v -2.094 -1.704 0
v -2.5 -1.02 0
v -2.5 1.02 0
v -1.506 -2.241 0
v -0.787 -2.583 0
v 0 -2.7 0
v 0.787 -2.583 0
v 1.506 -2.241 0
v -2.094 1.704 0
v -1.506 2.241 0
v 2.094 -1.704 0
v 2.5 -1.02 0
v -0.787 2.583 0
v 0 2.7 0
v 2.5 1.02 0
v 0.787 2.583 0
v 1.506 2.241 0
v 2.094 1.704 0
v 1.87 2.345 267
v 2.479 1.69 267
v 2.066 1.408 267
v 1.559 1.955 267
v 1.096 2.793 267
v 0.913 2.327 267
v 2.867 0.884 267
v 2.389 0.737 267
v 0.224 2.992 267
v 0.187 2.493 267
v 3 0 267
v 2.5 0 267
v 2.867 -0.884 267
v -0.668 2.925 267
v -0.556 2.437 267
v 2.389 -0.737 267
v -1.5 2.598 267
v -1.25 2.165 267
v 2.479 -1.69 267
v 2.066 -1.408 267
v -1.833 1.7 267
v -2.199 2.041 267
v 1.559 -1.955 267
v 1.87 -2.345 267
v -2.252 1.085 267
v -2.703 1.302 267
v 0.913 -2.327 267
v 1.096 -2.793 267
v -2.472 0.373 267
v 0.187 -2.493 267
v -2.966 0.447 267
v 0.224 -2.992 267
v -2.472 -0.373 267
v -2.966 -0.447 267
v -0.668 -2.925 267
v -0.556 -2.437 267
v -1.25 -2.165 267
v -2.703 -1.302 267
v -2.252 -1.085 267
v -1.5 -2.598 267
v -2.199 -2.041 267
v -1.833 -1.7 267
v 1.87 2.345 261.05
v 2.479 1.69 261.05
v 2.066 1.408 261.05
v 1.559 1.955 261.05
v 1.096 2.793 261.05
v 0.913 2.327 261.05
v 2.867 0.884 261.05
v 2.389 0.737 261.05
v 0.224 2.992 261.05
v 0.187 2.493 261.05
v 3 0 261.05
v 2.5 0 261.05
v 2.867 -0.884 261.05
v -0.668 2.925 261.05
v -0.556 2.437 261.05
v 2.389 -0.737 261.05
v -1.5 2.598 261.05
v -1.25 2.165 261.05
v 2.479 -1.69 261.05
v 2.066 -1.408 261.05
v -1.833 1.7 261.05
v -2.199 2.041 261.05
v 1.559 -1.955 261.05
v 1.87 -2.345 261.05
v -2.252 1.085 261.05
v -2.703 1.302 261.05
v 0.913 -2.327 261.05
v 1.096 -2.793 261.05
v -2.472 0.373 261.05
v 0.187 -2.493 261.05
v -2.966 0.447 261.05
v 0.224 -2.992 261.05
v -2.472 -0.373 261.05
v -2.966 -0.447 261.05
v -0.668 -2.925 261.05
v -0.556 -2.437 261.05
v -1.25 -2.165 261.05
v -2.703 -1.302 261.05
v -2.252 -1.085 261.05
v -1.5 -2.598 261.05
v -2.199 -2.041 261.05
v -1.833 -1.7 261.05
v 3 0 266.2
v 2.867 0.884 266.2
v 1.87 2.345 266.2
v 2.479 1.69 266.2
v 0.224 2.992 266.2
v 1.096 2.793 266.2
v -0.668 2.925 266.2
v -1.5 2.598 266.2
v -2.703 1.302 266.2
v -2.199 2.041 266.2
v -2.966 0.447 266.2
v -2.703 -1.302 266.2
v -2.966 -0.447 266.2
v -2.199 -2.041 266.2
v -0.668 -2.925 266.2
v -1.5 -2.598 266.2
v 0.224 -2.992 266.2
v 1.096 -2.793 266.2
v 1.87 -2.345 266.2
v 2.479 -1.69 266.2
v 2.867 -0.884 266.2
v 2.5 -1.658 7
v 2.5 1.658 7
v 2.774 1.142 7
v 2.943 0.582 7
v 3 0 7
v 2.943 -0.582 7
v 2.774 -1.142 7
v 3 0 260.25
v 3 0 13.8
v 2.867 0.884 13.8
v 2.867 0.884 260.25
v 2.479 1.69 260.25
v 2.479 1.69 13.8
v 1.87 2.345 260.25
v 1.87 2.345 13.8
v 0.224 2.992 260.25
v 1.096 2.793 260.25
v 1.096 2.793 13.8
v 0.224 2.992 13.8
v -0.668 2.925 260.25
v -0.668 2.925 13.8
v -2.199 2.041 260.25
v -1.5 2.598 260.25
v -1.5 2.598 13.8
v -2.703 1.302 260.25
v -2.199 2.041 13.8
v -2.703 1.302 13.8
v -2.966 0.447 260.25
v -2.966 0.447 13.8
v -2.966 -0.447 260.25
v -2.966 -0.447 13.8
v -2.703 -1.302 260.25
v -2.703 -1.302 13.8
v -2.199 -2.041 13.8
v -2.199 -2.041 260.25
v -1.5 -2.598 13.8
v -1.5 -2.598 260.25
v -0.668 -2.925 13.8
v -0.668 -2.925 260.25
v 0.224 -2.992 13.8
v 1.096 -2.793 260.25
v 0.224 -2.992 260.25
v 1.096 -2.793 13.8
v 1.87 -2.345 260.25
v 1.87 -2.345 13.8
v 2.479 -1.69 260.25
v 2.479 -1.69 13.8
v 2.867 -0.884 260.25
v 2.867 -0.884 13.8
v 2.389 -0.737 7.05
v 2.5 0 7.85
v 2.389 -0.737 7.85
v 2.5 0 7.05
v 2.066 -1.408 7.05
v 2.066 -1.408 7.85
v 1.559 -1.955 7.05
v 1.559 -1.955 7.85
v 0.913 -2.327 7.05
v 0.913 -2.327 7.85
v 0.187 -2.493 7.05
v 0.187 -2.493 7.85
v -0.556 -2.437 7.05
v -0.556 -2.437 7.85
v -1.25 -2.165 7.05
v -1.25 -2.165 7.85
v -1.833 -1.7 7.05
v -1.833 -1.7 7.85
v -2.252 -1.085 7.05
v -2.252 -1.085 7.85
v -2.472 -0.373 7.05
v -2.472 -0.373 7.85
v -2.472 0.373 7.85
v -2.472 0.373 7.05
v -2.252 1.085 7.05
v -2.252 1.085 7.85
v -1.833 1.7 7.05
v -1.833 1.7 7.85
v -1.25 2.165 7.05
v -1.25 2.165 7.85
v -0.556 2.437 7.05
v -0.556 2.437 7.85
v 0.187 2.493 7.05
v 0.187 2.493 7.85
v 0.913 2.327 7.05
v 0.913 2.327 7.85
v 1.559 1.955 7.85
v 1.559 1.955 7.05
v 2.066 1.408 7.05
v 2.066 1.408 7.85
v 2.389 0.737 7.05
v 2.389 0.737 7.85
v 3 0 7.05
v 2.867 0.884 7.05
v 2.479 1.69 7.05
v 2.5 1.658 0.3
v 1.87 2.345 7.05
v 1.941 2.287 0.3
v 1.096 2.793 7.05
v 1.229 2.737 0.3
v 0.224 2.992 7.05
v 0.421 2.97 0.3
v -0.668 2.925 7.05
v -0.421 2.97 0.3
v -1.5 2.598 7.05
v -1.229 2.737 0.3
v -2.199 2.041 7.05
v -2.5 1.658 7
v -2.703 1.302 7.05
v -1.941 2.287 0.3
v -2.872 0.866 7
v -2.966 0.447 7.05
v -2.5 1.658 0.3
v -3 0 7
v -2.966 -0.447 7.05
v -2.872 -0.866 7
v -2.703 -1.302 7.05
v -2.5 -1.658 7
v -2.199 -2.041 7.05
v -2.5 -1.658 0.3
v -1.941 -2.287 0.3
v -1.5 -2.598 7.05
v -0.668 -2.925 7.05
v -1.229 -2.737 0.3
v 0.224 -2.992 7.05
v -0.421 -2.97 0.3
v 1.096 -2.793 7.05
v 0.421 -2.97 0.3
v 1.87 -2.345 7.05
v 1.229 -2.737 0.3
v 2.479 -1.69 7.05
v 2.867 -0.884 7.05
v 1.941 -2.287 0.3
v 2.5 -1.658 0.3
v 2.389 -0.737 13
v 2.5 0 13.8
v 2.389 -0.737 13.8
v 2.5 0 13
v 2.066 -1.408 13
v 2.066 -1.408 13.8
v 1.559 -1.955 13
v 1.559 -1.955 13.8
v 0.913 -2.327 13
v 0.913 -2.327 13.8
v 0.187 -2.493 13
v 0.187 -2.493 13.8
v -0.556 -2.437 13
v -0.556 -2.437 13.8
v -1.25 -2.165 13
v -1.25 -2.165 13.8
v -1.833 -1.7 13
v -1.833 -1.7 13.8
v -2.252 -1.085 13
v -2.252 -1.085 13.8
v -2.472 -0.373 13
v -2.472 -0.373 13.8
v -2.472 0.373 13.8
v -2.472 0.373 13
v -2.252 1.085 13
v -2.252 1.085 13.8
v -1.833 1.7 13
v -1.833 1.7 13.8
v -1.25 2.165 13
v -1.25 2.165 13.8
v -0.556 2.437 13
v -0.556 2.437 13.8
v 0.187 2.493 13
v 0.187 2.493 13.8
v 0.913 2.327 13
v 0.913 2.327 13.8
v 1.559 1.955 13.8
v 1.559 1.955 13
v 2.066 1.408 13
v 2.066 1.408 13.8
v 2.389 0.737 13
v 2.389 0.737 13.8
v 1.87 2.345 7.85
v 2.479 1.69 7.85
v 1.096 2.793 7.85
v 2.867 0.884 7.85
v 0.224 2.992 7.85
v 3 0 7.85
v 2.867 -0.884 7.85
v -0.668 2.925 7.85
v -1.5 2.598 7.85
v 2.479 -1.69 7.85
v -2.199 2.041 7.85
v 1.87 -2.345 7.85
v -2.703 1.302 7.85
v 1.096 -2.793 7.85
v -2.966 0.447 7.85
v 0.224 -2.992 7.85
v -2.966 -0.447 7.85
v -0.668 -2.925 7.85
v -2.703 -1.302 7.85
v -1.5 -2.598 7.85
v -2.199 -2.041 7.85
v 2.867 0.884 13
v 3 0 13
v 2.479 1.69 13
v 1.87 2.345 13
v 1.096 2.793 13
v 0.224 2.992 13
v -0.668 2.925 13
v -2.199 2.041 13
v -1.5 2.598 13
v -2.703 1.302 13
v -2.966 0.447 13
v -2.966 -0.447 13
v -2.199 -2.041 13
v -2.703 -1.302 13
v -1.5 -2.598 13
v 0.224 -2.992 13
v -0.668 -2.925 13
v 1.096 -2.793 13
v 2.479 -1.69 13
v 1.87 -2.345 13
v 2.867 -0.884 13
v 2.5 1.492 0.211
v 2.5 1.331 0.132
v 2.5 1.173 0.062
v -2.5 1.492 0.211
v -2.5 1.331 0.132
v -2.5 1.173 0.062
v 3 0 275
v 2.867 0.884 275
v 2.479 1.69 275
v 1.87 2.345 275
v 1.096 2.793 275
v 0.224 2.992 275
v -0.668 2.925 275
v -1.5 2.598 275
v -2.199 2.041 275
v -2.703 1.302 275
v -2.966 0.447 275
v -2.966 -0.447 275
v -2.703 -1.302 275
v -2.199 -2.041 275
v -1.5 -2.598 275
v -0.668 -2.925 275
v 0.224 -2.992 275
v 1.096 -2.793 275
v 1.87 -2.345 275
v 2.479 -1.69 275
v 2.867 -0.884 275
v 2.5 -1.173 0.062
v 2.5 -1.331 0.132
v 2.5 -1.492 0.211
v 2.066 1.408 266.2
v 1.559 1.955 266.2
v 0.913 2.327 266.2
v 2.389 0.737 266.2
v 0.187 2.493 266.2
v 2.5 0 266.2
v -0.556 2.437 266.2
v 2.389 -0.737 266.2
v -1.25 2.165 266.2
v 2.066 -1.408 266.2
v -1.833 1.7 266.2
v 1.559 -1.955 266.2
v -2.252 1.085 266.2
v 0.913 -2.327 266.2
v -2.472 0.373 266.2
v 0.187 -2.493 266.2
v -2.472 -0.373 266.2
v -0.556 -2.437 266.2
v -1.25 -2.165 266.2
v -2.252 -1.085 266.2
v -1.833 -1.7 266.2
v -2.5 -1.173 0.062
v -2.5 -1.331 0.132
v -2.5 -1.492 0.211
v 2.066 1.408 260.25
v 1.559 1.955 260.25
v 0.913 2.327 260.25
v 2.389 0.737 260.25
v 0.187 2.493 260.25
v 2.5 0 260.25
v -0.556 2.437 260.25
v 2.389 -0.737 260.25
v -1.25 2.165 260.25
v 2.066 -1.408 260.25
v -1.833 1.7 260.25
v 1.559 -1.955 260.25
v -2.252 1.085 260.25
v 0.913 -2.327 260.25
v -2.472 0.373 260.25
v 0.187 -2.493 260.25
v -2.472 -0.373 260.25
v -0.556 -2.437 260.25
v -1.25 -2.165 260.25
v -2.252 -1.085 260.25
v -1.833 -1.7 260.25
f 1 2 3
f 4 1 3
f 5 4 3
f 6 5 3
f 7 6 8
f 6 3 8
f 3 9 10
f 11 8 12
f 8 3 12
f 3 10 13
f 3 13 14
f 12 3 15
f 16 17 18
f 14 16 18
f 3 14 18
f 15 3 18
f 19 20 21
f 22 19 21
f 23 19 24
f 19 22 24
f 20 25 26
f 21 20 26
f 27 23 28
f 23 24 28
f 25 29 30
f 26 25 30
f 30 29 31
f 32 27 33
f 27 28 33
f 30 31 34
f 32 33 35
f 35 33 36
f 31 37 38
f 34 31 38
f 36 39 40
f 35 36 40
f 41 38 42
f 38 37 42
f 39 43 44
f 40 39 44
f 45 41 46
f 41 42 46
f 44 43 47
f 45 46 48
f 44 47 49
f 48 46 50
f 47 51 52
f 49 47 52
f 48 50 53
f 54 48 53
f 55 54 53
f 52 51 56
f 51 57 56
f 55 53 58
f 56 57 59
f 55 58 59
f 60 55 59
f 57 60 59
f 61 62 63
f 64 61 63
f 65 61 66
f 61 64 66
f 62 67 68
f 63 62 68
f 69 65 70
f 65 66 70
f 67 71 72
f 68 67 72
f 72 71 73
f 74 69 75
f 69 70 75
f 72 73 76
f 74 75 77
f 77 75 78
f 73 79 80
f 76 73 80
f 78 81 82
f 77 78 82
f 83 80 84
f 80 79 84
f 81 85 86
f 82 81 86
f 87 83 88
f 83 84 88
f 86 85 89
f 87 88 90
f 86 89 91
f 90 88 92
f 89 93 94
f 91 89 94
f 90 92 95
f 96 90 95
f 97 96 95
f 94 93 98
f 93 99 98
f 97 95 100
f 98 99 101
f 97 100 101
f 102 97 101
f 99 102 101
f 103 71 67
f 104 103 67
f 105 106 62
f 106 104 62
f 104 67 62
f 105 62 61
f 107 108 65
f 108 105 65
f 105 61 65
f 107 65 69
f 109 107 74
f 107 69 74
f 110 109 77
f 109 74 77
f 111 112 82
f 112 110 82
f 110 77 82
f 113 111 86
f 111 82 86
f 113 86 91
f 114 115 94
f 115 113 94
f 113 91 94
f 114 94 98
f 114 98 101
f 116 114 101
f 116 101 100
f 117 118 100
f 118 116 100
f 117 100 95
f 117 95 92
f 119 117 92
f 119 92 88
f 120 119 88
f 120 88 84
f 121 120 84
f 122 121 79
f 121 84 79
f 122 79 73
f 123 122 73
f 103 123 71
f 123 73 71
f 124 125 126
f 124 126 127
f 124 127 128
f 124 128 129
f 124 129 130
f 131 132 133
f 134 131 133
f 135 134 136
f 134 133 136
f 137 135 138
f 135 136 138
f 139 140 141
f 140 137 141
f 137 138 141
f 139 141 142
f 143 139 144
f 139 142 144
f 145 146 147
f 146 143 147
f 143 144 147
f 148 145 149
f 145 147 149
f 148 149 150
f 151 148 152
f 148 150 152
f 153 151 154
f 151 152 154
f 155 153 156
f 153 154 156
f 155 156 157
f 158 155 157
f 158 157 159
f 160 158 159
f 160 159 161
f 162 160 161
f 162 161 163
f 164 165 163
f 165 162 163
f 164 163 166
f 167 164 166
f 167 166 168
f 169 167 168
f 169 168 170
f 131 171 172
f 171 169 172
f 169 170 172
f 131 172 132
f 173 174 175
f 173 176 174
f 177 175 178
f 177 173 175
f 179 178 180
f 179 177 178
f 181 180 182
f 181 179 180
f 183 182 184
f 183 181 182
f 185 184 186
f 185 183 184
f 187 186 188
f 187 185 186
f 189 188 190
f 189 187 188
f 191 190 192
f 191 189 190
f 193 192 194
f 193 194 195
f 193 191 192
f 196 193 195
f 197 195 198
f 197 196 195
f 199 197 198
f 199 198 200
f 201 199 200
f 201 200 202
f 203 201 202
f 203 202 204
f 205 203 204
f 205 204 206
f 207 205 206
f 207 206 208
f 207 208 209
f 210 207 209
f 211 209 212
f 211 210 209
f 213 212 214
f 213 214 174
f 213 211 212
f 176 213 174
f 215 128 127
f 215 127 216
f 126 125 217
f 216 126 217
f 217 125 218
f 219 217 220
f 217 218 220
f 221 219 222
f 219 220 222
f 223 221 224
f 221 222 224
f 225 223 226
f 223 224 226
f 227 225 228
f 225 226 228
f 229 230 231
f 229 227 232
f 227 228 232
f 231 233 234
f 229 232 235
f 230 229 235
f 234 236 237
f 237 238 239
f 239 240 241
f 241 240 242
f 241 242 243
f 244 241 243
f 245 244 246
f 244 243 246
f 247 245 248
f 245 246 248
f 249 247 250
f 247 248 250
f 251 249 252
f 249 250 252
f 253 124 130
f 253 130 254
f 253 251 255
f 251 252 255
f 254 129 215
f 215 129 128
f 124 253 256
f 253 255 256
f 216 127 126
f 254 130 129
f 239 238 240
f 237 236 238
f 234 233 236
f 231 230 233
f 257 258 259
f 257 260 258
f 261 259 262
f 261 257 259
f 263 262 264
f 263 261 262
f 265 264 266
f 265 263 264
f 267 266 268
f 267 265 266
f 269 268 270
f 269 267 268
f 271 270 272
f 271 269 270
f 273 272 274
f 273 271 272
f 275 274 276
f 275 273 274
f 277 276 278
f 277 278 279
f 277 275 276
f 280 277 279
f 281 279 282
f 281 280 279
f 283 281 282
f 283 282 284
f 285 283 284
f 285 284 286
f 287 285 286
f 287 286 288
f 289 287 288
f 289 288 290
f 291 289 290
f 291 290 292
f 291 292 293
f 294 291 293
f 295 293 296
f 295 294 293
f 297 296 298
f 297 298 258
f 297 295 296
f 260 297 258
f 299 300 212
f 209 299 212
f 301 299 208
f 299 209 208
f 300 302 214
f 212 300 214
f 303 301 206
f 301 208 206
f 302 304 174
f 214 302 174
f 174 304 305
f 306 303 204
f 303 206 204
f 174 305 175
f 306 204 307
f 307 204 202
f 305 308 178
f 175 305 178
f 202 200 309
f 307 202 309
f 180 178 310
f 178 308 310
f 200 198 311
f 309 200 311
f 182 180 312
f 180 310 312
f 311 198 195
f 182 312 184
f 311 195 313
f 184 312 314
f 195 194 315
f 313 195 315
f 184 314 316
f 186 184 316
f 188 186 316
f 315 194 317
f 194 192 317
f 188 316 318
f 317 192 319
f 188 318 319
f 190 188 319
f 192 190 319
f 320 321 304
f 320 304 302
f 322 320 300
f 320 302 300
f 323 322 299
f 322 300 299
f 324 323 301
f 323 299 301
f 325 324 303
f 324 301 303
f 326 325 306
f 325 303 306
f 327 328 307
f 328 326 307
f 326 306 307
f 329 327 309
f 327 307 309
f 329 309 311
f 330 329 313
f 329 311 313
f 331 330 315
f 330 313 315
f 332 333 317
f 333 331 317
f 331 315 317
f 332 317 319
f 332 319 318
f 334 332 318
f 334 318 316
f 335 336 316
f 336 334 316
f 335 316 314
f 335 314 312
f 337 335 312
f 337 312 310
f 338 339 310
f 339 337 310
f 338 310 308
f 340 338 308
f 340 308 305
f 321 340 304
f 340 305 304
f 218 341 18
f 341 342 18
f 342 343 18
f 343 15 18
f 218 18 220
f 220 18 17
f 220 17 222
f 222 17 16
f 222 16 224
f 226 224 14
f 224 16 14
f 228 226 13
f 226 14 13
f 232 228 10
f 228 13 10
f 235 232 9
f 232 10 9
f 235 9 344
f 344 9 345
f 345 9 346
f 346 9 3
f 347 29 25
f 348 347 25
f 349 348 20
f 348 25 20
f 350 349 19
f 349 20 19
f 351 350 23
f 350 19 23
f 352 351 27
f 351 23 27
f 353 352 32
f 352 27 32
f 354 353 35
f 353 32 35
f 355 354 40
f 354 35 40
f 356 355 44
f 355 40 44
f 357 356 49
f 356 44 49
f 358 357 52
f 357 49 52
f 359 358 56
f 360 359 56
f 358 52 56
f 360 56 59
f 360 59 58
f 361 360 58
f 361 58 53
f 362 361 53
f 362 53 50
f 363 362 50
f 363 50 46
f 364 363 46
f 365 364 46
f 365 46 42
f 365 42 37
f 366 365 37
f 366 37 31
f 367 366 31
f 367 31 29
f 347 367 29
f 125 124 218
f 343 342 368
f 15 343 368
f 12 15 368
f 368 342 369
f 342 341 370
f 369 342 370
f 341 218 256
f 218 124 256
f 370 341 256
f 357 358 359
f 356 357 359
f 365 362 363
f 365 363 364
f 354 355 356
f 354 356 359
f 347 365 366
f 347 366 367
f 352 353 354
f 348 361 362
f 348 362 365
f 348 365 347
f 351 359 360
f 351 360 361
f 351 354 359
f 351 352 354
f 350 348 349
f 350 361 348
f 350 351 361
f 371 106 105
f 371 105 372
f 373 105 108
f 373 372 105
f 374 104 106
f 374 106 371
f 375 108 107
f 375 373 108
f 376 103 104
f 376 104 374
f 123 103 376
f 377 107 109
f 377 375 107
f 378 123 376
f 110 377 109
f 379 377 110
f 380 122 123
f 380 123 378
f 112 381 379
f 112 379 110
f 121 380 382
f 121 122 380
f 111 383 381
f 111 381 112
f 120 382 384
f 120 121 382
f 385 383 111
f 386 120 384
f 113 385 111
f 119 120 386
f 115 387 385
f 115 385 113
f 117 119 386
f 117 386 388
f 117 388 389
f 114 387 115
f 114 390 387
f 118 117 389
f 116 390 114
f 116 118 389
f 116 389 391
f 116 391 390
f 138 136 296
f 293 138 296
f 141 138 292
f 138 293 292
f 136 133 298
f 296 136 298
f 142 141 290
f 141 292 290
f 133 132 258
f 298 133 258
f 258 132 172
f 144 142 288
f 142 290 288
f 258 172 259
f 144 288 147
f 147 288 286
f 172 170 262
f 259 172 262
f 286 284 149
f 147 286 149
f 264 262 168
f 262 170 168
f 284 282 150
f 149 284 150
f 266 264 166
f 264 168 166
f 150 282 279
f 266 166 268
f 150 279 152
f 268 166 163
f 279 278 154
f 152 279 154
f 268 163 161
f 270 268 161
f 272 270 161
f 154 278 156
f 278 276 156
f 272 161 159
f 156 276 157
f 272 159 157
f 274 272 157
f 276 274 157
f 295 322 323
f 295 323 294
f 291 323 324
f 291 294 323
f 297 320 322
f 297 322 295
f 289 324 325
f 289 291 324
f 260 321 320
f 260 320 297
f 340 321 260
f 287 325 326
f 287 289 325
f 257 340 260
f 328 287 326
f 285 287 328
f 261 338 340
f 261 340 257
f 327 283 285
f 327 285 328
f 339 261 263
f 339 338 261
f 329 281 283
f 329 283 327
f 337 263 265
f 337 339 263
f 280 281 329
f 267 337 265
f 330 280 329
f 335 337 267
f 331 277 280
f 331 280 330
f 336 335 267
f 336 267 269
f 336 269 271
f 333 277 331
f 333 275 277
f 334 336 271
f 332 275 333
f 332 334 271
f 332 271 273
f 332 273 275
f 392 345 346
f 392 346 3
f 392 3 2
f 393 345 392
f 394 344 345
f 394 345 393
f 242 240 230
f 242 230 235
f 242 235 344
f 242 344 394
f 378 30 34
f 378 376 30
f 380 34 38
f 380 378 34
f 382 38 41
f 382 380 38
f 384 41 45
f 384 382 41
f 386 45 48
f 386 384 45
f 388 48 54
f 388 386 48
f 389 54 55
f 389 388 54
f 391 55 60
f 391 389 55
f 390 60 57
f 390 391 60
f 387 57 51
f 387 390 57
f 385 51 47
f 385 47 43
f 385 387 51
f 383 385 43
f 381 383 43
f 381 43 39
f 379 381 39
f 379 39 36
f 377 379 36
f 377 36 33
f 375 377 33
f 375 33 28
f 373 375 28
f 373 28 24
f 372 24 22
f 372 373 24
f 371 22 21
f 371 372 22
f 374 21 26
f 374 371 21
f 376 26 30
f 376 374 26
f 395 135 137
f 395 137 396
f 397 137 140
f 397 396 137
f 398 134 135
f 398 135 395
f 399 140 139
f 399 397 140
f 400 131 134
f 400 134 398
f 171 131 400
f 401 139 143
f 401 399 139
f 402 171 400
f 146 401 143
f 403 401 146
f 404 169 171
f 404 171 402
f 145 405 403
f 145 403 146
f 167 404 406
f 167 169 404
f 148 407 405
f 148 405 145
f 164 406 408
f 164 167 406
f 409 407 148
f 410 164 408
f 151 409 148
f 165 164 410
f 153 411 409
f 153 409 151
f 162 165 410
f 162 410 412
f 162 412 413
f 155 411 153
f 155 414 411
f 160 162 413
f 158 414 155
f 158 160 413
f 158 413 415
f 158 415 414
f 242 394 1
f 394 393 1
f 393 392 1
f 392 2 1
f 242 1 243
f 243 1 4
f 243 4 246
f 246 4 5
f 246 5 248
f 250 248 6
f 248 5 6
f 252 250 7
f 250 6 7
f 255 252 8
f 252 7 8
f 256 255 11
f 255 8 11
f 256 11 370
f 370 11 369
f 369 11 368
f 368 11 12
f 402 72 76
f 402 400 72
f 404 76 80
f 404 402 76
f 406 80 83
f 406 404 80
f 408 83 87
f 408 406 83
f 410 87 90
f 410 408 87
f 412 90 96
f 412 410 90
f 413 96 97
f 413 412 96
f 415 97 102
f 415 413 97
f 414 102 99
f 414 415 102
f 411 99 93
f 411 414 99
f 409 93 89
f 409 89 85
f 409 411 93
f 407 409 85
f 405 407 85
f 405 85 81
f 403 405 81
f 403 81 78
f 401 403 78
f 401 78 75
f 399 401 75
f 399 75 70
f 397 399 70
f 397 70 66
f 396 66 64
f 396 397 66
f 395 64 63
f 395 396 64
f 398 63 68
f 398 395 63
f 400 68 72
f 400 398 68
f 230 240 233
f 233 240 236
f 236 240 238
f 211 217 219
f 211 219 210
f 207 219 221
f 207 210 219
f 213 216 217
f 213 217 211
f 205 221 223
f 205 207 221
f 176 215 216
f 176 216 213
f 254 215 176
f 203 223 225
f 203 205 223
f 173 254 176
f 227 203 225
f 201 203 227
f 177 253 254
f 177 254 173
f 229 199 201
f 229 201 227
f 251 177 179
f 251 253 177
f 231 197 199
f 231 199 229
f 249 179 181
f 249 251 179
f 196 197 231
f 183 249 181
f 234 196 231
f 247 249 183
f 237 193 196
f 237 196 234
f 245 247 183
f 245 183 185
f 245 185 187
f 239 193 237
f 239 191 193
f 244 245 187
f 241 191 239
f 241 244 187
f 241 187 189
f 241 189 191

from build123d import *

# Parameters (mm, degrees)
SKETCH1_R               = 3
BOSS_EXTRUDE1_DEPTH     = 275
SKETCH3_W               = 0.8
SKETCH3_H               = 0.5
CUT_EXTRUDE2_DEPTH      = 276.032725326
CUT_EXTRUDE2_DEPTH_BACK = 276.032725326
SKETCH4_W               = 3.470061058
SKETCH4_H               = 7
SKETCH4_W_2             = 2.92528695
CHAMFER1_SIZE           = 0.3


with BuildPart() as part:
    # Sketch1 → Boss-Extrude1 (new body)
    with BuildSketch(Plane.XY):
        Circle(SKETCH1_R)
    extrude(amount=BOSS_EXTRUDE1_DEPTH)

    # Sketch3 → Cut-Revolve1 (revolve, cut)
    with BuildSketch(Plane(origin=(0, 0, 0), x_dir=(0, 0, -1), z_dir=(1, 0, 0)), mode=Mode.PRIVATE) as cut_revolve1_sk:
        with Locations((-266.6, 2.75)):
            Rectangle(SKETCH3_W, SKETCH3_H)
        with Locations((-260.65, 2.75)):
            Rectangle(SKETCH3_W, SKETCH3_H)
        with Locations((-13.4, 2.75)):
            Rectangle(SKETCH3_W, SKETCH3_H)
        with Locations((-7.45, 2.75)):
            Rectangle(SKETCH3_W, SKETCH3_H)
    revolve(cut_revolve1_sk.sketch.rotate(Axis((0, 0, 263.365004794), (0, 0, -1)), 90), axis=Axis((0, 0, 263.365004794), (0, 0, -1)), mode=Mode.SUBTRACT)

    # Sketch4 → Cut-Extrude2 (cut, two sides: drawn at the far end of the back side and taken through both)
    with BuildSketch(Plane(origin=(0, 0, 0), x_dir=(1, 0, 0), z_dir=(0, 1, 0)).offset(-CUT_EXTRUDE2_DEPTH_BACK)):
        with Locations((4.235030529, -3.5)):
            Rectangle(SKETCH4_W, SKETCH4_H)
        with Locations((-3.962643475, -3.5)):
            Rectangle(SKETCH4_W_2, SKETCH4_H)
    extrude(amount=CUT_EXTRUDE2_DEPTH + CUT_EXTRUDE2_DEPTH_BACK, mode=Mode.SUBTRACT)

    # Chamfer1
    chamfer1_edges = [part.edges().sort_by_distance(p)[0] for p in [
        (0, 3, 0),
        (0, -3, 0),
    ]]
    chamfer(chamfer1_edges, length=CHAMFER1_SIZE)


solid = part.part
